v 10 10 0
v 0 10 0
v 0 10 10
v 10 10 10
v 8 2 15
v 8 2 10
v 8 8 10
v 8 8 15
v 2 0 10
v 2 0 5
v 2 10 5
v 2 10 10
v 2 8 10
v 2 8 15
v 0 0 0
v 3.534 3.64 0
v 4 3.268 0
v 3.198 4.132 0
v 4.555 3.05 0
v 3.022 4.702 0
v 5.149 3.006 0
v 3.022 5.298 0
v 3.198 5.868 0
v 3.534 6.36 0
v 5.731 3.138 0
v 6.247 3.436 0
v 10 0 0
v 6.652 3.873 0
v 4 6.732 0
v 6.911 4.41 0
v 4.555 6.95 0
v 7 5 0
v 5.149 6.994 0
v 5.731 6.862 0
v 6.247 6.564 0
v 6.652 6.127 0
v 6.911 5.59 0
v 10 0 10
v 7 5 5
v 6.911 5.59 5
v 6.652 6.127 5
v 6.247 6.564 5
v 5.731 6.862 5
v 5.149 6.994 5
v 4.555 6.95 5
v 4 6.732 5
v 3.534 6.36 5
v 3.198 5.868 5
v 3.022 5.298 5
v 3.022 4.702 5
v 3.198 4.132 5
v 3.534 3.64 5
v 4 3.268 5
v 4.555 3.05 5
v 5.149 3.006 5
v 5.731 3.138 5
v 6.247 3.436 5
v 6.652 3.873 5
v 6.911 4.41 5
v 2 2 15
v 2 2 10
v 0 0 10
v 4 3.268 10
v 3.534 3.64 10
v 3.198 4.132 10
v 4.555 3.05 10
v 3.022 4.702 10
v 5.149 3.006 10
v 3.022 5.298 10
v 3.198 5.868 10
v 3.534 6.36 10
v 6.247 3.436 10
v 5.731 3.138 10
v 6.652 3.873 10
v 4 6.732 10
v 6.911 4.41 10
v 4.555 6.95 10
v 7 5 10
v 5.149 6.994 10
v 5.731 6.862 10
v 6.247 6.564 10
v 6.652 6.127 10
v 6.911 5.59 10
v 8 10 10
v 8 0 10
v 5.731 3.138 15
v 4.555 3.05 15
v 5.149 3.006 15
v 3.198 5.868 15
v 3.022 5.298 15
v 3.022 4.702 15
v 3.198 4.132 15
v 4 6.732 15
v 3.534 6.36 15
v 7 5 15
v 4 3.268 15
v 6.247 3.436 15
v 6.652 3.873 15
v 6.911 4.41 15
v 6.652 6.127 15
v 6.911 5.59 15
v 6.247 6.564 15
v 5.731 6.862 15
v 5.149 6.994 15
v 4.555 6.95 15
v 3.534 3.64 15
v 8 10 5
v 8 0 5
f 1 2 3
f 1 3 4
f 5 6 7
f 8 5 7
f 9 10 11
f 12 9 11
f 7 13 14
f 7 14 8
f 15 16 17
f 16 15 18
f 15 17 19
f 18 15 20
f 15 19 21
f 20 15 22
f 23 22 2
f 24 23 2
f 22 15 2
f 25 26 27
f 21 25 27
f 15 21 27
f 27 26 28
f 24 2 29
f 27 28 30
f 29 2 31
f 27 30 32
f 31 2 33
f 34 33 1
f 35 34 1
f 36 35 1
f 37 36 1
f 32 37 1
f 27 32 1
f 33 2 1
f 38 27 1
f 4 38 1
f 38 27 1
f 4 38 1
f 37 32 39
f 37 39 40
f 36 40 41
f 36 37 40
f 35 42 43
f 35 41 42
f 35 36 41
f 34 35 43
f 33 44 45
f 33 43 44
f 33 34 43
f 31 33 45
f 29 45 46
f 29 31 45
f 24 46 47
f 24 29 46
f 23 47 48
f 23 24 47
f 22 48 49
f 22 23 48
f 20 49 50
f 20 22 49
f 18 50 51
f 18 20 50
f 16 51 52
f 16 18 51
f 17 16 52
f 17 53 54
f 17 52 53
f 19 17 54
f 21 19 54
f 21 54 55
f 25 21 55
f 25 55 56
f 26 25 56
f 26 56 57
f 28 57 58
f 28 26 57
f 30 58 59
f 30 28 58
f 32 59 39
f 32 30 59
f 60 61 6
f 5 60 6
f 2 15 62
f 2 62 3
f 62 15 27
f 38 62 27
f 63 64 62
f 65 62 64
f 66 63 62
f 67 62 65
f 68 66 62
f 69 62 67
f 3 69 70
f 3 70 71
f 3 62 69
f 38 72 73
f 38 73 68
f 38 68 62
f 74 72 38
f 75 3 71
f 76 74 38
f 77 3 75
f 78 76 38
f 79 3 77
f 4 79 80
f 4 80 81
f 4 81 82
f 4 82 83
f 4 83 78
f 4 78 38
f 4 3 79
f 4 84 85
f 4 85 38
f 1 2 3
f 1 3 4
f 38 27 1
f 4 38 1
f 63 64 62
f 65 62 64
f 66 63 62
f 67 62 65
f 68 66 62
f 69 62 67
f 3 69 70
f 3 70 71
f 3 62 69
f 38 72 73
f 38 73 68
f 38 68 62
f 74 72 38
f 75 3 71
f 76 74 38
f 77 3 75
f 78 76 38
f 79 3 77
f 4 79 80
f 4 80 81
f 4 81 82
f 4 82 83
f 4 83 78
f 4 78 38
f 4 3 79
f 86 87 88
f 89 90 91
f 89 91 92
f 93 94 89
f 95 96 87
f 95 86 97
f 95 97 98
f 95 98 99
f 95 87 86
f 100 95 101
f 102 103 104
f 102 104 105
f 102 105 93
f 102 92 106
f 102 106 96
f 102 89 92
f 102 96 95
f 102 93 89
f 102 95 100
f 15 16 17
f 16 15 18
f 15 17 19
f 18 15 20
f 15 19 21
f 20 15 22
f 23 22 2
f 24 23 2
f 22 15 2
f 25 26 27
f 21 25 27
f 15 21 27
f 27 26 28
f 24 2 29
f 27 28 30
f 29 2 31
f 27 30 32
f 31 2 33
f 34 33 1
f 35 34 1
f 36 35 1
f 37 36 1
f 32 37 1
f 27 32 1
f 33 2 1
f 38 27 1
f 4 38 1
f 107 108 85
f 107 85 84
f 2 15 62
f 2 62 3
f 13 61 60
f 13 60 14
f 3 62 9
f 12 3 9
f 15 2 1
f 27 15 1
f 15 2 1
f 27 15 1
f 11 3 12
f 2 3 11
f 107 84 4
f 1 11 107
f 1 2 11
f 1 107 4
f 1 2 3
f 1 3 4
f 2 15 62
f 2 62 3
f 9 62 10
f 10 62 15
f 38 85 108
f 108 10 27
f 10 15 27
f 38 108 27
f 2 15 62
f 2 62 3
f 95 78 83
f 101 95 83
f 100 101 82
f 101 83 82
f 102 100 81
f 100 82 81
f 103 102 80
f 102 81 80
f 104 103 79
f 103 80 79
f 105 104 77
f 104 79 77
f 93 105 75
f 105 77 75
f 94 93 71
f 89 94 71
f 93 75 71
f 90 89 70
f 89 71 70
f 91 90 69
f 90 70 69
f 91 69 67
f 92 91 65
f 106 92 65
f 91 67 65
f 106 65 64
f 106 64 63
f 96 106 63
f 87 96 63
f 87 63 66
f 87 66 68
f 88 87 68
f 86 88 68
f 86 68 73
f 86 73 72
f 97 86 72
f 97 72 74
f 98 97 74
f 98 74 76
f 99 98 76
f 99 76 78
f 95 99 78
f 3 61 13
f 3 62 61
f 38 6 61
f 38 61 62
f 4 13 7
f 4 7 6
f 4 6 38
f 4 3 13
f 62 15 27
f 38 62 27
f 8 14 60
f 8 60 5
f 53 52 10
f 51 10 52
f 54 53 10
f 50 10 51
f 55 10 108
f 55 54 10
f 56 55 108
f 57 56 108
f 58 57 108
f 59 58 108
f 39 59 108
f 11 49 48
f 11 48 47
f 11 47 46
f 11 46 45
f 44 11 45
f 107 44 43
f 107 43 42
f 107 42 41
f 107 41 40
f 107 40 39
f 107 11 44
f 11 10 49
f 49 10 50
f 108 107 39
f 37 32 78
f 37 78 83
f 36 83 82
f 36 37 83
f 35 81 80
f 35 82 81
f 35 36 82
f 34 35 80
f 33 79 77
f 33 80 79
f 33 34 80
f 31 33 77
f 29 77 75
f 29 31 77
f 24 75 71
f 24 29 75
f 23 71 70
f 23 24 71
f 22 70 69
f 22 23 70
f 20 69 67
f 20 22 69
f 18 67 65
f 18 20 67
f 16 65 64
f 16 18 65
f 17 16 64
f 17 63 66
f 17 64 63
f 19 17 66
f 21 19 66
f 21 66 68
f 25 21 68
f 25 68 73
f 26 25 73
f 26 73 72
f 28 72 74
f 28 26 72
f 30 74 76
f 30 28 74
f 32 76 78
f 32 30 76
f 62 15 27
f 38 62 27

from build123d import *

# Parameters (mm, degrees)
CYLINDER_R        = 2
CYLINDER_DEPTH    = 10
BOX001_W          = 6
BOX001_H          = 14
BOX001_DEPTH      = 10
BOX_W             = 10
BOX_H             = 10
BOX_DEPTH         = 10
BOX003_W          = 6
BOX003_H          = 6
BOX003_DEPTH      = 10
BOX002_W          = 10
BOX002_H          = 10
BOX002_DEPTH      = 10
CYLINDER001_R     = 2
CYLINDER001_DEPTH = 12
BOX004_W          = 10
BOX004_H          = 10
BOX004_DEPTH      = 10
CYLINDER002_R     = 2
CYLINDER002_DEPTH = 12
BOX005_W          = 10
BOX005_H          = 10
BOX005_DEPTH      = 10


with BuildPart() as cylinder:
    # Cylinder → Cylinder (new body)
    with BuildSketch(Plane(origin=(5, 5, -1), x_dir=(1, 0, 0), z_dir=(0, 0, 1))):
        Circle(CYLINDER_R)
    extrude(amount=CYLINDER_DEPTH)


with BuildPart() as cube001:
    # Box001 → Box001 (new body)
    with BuildSketch(Plane(origin=(2, -1, 5), x_dir=(1, 0, 0), z_dir=(0, 0, 1))):
        with Locations((3, 7)):
            Rectangle(BOX001_W, BOX001_H)
    extrude(amount=BOX001_DEPTH)


with BuildPart() as cut001:
    # Box → Box (new body)
    with BuildSketch(Plane.XY):
        with Locations((5, 5)):
            Rectangle(BOX_W, BOX_H)
    extrude(amount=BOX_DEPTH)

    # Cut: cut Cube001
    add(cube001.part, mode=Mode.SUBTRACT)

    # Cut001: cut Cylinder
    add(cylinder.part, mode=Mode.SUBTRACT)


with BuildPart() as cube003:
    # Box003 → Box003 (new body)
    with BuildSketch(Plane(origin=(2, 2, 5), x_dir=(1, 0, 0), z_dir=(0, 0, 1))):
        with Locations((3, 3)):
            Rectangle(BOX003_W, BOX003_H)
    extrude(amount=BOX003_DEPTH)


with BuildPart() as fusion:
    # Box002 → Box002 (new body)
    with BuildSketch(Plane.XY):
        with Locations((5, 5)):
            Rectangle(BOX002_W, BOX002_H)
    extrude(amount=BOX002_DEPTH)

    # Fusion: union Cube003
    add(cube003.part)


with BuildPart() as cylinder001:
    # Cylinder001 → Cylinder001 (new body)
    with BuildSketch(Plane(origin=(5, 5, -1), x_dir=(1, 0, 0), z_dir=(0, 0, 1))):
        Circle(CYLINDER001_R)
    extrude(amount=CYLINDER001_DEPTH)


with BuildPart() as cube_cylinder:
    # Box004 → Box004 (new body)
    with BuildSketch(Plane.XY):
        with Locations((5, 5)):
            Rectangle(BOX004_W, BOX004_H)
    extrude(amount=BOX004_DEPTH)

    # Cut002: cut Cylinder001
    add(cylinder001.part, mode=Mode.SUBTRACT)


with BuildPart() as cylinder002:
    # Cylinder002 → Cylinder002 (new body)
    with BuildSketch(Plane(origin=(5, 5, 3), x_dir=(1, 0, 0), z_dir=(0, 0, 1))):
        Circle(CYLINDER002_R)
    extrude(amount=CYLINDER002_DEPTH)


with BuildPart() as cubepluscylinder:
    # Box005 → Box005 (new body)
    with BuildSketch(Plane.XY):
        with Locations((5, 5)):
            Rectangle(BOX005_W, BOX005_H)
    extrude(amount=BOX005_DEPTH)

    # Fusion001: union Cylinder002
    add(cylinder002.part)


solid = Compound([cut001.part, fusion.part, cube_cylinder.part, cubepluscylinder.part])
